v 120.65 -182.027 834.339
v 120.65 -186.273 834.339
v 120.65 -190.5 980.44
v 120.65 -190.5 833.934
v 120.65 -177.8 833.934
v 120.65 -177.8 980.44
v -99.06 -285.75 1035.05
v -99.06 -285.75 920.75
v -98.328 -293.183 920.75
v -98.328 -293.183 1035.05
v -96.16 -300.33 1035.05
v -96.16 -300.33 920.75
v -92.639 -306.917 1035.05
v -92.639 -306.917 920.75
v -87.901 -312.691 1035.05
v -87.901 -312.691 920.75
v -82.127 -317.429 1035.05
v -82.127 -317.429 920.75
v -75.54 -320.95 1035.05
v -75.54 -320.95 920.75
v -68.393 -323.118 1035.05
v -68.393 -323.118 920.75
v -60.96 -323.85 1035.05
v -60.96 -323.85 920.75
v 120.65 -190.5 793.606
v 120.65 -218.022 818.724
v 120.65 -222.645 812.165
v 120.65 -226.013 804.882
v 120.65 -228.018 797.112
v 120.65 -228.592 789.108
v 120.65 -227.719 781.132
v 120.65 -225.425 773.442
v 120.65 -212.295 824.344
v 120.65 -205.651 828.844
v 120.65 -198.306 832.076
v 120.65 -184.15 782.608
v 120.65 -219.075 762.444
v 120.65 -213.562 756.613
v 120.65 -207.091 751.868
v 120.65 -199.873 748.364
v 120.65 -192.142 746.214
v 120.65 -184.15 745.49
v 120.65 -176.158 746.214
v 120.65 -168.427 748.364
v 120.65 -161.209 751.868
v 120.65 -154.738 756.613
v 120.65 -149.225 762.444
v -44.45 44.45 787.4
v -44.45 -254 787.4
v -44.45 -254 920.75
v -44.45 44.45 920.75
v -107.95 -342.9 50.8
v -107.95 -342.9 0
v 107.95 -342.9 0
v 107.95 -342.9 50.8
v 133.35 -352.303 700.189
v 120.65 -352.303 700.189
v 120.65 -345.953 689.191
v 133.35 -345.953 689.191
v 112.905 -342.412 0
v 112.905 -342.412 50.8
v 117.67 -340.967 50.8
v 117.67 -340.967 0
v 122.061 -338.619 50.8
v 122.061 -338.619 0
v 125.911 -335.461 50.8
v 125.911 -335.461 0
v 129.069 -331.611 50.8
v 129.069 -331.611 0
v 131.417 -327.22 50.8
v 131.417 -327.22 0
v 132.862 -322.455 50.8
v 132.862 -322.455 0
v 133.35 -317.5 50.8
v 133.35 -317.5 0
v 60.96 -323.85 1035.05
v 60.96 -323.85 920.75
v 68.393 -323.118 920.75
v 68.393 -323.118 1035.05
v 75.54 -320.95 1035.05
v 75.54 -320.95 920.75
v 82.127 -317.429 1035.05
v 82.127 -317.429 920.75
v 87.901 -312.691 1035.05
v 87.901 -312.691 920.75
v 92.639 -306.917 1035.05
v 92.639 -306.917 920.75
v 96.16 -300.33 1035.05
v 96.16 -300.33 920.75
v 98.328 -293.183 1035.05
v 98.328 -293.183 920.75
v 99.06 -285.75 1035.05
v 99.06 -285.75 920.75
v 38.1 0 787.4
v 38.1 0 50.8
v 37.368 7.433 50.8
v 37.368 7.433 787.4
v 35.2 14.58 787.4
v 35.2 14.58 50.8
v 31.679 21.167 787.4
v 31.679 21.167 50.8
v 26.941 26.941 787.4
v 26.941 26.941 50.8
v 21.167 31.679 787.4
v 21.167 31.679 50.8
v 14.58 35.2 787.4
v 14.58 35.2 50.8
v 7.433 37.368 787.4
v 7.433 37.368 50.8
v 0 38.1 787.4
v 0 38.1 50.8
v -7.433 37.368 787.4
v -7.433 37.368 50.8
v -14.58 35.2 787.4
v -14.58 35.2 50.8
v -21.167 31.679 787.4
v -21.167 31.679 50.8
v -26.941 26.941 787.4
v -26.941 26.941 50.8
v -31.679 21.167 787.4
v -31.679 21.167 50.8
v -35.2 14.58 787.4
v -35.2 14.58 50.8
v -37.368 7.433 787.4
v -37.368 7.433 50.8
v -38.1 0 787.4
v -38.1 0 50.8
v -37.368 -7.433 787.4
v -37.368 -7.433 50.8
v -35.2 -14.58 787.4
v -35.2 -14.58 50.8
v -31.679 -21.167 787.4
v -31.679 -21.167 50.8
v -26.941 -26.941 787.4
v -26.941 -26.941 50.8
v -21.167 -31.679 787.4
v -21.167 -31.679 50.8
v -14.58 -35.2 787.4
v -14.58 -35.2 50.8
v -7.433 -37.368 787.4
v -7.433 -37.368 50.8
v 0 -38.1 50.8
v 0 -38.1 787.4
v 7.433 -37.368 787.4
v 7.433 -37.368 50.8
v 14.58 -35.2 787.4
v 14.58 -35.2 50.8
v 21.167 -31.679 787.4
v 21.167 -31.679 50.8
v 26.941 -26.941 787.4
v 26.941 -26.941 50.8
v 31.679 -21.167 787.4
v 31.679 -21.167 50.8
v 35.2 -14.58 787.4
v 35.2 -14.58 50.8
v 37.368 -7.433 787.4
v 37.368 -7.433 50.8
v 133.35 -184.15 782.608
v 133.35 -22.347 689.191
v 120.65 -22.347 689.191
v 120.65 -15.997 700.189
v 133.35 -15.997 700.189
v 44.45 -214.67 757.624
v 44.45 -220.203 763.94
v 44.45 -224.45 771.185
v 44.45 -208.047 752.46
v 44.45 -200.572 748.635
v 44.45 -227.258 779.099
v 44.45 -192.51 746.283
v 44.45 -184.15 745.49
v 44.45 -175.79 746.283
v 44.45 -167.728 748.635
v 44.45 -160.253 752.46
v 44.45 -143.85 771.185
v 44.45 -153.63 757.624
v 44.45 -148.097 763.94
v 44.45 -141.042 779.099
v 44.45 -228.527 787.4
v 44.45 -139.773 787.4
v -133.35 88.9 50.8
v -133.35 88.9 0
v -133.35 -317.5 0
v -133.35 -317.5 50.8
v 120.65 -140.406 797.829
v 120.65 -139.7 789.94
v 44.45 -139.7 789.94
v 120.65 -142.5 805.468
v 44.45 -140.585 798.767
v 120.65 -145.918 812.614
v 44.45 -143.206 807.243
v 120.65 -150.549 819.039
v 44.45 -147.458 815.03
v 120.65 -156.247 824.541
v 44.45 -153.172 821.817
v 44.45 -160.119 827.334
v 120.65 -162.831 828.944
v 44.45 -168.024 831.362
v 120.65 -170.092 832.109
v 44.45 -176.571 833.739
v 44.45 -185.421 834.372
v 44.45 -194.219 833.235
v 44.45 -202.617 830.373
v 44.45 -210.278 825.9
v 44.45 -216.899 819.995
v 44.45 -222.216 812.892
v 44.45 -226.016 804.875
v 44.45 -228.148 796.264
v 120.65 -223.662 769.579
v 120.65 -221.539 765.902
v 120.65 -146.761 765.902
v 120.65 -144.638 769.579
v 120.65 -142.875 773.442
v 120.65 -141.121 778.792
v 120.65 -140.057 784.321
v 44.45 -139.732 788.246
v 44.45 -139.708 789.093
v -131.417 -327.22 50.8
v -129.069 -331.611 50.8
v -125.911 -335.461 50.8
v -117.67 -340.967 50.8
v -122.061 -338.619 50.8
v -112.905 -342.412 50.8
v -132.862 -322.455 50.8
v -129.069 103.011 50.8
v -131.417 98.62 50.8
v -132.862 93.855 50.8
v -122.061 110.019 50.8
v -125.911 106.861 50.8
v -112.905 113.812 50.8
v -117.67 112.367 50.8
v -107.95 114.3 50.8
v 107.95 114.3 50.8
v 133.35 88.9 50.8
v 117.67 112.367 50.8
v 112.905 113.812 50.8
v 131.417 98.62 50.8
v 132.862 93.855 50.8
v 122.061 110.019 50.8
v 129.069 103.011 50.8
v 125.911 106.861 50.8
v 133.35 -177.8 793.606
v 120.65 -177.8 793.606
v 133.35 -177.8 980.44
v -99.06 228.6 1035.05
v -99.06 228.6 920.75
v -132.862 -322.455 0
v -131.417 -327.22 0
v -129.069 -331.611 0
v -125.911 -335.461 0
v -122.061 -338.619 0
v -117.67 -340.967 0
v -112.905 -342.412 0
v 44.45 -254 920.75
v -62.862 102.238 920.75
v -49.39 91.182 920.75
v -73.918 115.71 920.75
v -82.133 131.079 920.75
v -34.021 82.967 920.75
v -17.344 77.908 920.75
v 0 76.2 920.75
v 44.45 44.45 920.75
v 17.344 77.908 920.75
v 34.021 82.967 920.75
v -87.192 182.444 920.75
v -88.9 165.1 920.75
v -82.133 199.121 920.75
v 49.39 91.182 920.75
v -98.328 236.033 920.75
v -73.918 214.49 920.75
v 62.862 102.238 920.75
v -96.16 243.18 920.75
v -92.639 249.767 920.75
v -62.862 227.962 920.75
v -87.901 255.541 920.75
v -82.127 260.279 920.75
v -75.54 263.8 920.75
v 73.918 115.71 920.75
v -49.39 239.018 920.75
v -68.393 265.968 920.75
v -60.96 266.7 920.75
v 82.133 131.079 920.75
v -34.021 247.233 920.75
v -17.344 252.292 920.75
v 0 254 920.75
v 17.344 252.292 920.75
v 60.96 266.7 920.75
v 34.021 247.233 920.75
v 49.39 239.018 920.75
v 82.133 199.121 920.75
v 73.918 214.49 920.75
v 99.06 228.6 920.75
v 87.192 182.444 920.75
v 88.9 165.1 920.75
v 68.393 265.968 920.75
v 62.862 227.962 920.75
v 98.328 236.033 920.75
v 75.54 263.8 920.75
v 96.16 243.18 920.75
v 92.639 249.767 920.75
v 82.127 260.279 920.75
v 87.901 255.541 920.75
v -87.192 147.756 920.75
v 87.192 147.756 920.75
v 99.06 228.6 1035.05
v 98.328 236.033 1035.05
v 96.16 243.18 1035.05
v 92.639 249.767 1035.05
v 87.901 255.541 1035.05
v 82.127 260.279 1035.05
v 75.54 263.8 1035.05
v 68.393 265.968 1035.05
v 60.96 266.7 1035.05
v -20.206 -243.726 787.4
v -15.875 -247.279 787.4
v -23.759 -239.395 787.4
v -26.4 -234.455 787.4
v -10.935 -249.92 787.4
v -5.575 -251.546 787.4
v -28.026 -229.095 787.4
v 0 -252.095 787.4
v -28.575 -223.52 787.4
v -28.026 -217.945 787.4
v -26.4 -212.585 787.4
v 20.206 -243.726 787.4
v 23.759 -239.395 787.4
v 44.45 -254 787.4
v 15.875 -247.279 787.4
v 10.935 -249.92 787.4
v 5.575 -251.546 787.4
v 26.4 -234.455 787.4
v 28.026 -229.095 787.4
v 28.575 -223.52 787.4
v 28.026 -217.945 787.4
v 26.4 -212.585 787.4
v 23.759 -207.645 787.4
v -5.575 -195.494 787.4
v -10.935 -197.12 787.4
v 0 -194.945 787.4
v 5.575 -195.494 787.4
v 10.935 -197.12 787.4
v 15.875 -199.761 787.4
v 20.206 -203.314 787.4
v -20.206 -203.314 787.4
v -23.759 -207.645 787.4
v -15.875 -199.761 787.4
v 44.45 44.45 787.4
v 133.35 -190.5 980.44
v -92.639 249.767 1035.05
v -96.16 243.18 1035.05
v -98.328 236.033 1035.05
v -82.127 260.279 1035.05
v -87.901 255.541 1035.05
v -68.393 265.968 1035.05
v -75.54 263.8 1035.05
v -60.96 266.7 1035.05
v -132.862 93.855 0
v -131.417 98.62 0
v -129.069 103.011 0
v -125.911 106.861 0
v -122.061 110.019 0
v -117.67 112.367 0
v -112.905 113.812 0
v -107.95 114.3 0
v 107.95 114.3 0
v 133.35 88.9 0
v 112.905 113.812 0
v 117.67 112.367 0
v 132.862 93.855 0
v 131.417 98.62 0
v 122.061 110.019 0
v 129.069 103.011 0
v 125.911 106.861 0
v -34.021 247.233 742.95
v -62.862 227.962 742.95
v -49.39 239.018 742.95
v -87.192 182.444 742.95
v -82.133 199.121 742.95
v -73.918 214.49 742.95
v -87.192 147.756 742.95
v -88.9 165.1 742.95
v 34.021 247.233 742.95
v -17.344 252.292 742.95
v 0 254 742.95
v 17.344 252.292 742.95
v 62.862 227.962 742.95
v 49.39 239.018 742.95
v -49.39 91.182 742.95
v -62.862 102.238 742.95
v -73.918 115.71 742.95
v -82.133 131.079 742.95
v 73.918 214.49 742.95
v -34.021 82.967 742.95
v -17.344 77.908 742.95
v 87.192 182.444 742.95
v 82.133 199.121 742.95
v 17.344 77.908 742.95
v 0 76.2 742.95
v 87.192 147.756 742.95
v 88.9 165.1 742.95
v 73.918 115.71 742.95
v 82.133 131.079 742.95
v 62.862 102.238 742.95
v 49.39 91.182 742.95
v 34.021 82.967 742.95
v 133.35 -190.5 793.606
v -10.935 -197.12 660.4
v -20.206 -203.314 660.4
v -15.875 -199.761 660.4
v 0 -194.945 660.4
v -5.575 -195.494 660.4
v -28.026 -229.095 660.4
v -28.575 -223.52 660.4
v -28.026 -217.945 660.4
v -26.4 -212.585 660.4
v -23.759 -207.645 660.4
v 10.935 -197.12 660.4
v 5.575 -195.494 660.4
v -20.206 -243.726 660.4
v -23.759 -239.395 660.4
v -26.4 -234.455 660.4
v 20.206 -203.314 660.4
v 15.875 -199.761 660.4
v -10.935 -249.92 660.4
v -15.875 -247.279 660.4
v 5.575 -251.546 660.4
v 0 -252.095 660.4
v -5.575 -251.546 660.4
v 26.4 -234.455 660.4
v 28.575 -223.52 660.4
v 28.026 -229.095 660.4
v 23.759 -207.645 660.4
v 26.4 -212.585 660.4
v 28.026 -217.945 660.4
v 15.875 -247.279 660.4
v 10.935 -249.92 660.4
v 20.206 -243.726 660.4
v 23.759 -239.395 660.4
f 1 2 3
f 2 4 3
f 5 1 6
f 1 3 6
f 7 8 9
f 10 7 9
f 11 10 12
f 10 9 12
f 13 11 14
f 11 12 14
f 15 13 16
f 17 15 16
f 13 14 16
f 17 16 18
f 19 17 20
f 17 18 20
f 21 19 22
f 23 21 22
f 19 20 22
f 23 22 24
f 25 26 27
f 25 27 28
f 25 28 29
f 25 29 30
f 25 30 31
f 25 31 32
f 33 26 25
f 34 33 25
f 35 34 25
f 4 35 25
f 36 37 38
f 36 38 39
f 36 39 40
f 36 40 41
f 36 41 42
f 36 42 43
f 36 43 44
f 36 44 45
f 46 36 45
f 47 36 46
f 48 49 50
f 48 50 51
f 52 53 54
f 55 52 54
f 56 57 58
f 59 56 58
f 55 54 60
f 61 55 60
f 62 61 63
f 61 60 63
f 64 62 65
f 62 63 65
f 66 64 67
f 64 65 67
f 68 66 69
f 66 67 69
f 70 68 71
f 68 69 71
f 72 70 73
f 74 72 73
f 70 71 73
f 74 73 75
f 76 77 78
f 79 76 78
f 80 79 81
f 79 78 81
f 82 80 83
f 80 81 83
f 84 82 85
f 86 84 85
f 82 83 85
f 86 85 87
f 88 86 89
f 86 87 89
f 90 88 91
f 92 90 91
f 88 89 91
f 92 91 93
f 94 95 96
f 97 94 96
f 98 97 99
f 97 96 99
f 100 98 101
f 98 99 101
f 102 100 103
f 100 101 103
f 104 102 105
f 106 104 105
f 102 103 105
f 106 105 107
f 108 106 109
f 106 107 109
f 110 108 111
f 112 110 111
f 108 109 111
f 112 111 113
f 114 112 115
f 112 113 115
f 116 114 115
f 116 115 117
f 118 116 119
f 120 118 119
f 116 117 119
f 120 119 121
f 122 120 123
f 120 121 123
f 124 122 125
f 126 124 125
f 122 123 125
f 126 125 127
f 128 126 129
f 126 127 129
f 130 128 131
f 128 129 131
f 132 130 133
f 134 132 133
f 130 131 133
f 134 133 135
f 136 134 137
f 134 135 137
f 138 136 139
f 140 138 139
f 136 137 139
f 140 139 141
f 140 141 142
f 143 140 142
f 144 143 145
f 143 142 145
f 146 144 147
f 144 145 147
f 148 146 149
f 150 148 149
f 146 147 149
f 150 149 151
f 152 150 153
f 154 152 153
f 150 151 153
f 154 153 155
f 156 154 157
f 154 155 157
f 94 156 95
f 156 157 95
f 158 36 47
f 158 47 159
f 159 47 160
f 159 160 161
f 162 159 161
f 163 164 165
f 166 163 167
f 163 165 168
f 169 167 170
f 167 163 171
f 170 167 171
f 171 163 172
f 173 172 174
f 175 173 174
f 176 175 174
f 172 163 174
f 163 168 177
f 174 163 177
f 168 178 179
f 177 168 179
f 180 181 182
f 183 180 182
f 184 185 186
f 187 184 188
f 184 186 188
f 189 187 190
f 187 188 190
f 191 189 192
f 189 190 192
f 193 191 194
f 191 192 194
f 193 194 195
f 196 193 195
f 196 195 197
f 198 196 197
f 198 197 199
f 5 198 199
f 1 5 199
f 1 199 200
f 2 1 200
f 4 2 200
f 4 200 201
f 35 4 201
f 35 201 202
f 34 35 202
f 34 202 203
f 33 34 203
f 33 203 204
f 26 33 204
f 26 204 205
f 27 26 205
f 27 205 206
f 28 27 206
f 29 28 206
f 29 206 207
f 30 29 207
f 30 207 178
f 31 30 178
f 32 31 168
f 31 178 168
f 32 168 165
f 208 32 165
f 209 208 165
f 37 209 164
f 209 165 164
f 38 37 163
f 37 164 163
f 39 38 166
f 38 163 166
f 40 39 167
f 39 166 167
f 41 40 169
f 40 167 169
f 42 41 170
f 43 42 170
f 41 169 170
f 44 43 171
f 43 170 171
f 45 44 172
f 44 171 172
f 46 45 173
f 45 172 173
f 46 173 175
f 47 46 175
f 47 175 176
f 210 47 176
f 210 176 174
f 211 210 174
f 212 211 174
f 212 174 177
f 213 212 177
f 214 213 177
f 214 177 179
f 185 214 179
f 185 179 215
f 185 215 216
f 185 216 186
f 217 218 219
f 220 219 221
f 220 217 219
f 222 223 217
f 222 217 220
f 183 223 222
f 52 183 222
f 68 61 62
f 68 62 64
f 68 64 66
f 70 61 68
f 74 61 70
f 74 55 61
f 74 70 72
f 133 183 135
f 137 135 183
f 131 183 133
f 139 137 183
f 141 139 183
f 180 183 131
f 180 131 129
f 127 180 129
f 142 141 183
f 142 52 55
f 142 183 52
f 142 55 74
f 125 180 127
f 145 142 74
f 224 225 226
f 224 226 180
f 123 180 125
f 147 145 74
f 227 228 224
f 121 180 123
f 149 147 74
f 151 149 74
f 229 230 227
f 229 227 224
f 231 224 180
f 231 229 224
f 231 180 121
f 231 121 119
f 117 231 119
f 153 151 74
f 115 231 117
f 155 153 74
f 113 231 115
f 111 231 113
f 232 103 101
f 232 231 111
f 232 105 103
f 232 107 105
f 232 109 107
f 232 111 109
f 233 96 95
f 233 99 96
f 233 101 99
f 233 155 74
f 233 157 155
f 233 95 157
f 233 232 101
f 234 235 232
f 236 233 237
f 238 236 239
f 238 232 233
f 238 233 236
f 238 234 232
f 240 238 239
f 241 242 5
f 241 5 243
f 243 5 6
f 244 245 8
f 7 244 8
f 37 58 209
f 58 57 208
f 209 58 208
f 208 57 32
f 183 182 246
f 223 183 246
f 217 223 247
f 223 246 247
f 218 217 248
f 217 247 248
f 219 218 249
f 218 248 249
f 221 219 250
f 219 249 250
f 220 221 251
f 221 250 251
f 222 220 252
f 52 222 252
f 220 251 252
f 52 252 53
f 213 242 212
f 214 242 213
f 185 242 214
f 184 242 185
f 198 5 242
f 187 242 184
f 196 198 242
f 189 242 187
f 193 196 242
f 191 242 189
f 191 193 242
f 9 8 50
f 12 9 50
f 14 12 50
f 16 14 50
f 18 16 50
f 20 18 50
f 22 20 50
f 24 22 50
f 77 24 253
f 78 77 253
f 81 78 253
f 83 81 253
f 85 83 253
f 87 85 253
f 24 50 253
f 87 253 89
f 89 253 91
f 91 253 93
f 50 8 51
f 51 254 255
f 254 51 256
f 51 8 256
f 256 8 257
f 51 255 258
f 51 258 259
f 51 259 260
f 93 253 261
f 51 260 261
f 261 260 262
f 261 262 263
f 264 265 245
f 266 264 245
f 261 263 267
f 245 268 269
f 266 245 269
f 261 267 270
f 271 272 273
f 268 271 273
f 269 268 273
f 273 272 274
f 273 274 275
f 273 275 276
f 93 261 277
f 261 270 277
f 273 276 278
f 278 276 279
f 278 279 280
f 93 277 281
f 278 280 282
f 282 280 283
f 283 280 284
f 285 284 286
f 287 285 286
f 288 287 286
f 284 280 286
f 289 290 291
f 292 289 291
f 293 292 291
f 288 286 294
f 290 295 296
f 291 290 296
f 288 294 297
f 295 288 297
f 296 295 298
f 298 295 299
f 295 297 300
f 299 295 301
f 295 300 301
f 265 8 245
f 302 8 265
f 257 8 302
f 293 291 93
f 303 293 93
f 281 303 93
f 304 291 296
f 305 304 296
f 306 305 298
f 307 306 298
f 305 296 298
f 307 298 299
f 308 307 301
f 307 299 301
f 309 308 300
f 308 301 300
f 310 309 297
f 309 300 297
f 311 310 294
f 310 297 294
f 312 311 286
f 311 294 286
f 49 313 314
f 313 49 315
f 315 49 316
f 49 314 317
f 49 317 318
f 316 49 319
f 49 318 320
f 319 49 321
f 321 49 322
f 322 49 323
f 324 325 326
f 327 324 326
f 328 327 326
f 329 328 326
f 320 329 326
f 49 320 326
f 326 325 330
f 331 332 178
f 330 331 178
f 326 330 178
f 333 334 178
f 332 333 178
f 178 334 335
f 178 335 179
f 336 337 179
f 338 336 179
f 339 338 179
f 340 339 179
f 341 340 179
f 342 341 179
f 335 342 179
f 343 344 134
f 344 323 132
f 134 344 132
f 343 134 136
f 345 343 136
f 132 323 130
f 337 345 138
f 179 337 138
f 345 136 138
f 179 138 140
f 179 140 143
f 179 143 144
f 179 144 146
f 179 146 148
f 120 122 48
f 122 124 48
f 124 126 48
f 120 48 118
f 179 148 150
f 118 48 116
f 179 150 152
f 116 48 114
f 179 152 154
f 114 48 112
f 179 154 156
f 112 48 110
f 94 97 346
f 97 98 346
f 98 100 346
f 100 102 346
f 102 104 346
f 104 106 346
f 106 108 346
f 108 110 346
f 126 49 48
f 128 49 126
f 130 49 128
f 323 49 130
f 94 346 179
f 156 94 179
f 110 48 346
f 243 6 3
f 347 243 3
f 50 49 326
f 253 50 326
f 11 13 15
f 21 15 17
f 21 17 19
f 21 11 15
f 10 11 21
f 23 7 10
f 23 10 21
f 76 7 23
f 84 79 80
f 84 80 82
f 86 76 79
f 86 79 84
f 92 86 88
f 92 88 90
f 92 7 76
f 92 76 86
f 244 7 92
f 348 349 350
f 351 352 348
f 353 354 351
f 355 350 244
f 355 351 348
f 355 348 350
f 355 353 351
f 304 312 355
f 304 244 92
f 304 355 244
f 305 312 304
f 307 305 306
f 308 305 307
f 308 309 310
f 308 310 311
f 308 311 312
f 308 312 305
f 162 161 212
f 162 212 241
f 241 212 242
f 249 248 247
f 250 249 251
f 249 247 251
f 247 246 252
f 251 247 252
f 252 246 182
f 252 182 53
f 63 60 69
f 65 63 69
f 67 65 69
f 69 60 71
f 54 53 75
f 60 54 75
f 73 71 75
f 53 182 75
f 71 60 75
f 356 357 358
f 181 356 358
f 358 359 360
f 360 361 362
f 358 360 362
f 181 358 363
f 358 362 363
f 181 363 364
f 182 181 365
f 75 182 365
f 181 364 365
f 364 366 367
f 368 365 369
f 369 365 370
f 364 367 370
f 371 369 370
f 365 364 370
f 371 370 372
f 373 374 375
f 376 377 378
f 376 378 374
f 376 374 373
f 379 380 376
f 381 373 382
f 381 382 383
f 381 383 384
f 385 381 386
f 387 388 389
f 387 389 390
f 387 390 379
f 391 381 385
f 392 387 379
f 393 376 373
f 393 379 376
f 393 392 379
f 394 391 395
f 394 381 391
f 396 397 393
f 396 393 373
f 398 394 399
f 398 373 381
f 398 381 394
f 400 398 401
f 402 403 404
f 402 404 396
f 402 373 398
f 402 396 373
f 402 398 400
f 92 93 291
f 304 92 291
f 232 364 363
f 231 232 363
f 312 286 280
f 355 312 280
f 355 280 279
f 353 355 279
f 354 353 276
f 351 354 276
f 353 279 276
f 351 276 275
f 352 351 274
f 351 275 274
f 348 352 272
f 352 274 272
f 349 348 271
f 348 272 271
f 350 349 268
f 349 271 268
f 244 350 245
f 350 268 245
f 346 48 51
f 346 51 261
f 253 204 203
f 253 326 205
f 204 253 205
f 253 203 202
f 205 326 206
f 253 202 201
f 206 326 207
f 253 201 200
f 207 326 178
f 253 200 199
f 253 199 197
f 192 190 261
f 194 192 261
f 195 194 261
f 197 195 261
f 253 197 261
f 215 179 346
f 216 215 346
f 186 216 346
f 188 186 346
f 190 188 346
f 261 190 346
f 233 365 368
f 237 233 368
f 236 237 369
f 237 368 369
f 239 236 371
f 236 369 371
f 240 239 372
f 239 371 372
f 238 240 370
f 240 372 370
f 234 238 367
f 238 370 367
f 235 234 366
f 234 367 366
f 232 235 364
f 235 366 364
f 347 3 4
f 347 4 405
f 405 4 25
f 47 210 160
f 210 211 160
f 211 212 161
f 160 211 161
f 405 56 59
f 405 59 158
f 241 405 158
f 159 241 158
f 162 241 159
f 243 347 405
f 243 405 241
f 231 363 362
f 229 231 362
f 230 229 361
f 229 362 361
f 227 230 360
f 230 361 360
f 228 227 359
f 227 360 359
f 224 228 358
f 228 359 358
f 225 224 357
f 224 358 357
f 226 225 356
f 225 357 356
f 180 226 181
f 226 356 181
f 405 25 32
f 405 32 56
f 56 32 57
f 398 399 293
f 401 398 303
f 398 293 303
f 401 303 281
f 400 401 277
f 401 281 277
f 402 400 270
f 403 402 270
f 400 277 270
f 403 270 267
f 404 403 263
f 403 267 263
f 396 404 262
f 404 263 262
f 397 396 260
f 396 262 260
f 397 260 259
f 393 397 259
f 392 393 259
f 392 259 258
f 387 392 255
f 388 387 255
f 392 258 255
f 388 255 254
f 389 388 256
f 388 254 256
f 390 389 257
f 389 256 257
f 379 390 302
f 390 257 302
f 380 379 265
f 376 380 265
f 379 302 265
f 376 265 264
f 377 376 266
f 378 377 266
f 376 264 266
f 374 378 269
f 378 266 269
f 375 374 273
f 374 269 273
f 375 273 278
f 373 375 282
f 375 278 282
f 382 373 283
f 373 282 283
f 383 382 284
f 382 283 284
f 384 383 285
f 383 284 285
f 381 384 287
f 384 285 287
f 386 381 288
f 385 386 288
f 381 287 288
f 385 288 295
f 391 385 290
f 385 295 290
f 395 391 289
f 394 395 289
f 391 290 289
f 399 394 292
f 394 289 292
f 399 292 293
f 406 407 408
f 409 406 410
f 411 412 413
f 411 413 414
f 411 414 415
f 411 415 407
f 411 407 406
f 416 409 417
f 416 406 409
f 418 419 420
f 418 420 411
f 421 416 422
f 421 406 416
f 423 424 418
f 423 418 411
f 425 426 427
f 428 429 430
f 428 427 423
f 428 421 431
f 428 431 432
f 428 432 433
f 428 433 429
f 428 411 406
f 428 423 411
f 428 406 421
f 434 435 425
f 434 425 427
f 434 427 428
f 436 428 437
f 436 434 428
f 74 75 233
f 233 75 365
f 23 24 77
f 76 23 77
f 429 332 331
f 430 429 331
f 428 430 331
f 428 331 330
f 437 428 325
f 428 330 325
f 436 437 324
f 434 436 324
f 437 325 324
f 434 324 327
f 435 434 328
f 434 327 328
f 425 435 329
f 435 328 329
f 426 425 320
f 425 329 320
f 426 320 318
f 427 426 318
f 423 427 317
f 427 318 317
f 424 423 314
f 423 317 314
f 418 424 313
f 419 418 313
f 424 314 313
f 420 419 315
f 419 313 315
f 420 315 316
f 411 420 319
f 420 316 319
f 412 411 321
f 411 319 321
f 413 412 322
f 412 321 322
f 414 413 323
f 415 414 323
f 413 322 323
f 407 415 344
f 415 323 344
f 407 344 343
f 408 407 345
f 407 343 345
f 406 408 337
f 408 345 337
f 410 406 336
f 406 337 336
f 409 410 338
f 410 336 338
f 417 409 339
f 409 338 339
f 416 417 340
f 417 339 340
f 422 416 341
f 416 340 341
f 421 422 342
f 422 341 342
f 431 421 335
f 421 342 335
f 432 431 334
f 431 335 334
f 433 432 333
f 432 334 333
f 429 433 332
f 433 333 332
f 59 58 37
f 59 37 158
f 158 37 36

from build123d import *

# Parameters (mm, degrees)
F1_DEPTH  = 50.8
F2_R      = 38.1
F3_DEPTH  = 736.6
F4_W      = 88.9
F4_H      = 298.45
F5_DEPTH  = 133.35
F7_DEPTH  = 114.3
F8_R      = 88.9
F9_DEPTH  = 177.8
F10_R     = 44.45
F11_DEPTH = 76.2
F13_DEPTH = 12.7
F14_DEPTH = 12.7
F15_R     = 28.575
F16_DEPTH = 127


with BuildPart() as f1:
    # F0 (on Top) → F1 (new body)
    with BuildSketch(Plane.XY):
        with BuildLine():
            Line((107.95, 114.3), (-107.95, 114.3))
            ThreePointArc((-107.95, 114.3), (-125.910512, 106.860512), (-133.35, 88.9))
            Line((-133.35, 88.9), (-133.35, -317.5))
            ThreePointArc((-133.35, -317.5), (-125.910512, -335.460512), (-107.95, -342.9))
            Line((-107.95, -342.9), (107.95, -342.9))
            ThreePointArc((107.95, -342.9), (125.910512, -335.460512), (133.35, -317.5))
            Line((133.35, -317.5), (133.35, 88.9))
            ThreePointArc((133.35, 88.9), (125.910512, 106.860512), (107.95, 114.3))
        make_face()
    extrude(amount=F1_DEPTH)

    # F2 (on face) → F3 (join)
    with BuildSketch(Plane.XY.offset(50.8)):
        Circle(F2_R)
    extrude(amount=F3_DEPTH)

    # F4 (on face) → F5 (join)
    with BuildSketch(Plane.XY.offset(787.4)):
        with Locations((0, -104.775)):
            Rectangle(F4_W, F4_H)
    extrude(amount=F5_DEPTH)

    # F6 (on face) → F7 (join)
    with BuildSketch(Plane.XY.offset(920.75)):
        with BuildLine():
            Line((60.96, 266.7), (-60.96, 266.7))
            ThreePointArc((-60.96, 266.7), (-87.900768, 255.540768), (-99.06, 228.6))
            Line((-99.06, 228.6), (-99.06, -285.75))
            ThreePointArc((-99.06, -285.75), (-87.900768, -312.690768), (-60.96, -323.85))
            Line((-60.96, -323.85), (60.96, -323.85))
            ThreePointArc((60.96, -323.85), (87.900768, -312.690768), (99.06, -285.75))
            Line((99.06, -285.75), (99.06, 228.6))
            ThreePointArc((99.06, 228.6), (87.900768, 255.540768), (60.96, 266.7))
        make_face()
    extrude(amount=F7_DEPTH)

    # F8 (on face) → F9 (join)
    with BuildSketch(Plane(origin=(0, 0, 920.75), x_dir=(1, 0, 0), z_dir=(0, 0, -1))):
        with Locations((0, -165.1)):
            Circle(F8_R)
    extrude(amount=F9_DEPTH)

    # F10 (on face) → F11 (join)
    with BuildSketch(Plane.YZ.offset(44.45)):
        with Locations((-184.15, 789.94)):
            Circle(F10_R)
    extrude(amount=F11_DEPTH)

    # F12 (on face) → F13 (join)
    with BuildSketch(Plane.YZ.offset(120.65)):
        Polygon((-15.997161, 700.189261), (-177.8, 793.606174), (-177.8, 980.44), (-190.5, 980.44), (-190.5, 793.606174), (-352.302839, 700.189261), (-345.952839, 689.190739), (-184.15, 782.607652), (-22.347161, 689.190739), align=None)
    extrude(amount=F13_DEPTH)

    # F12 (on face) → F14 (join)
    with BuildSketch(Plane.YZ.offset(120.65)):
        Polygon((-15.997161, 700.189261), (-177.8, 793.606174), (-177.8, 980.44), (-190.5, 980.44), (-190.5, 793.606174), (-352.302839, 700.189261), (-345.952839, 689.190739), (-184.15, 782.607652), (-22.347161, 689.190739), align=None)
    extrude(amount=F14_DEPTH)

    # F15 (on face) → F16 (join)
    with BuildSketch(Plane(origin=(0, 0, 787.4), x_dir=(1, 0, 0), z_dir=(0, 0, -1))):
        with Locations((0, 223.52)):
            Circle(F15_R)
    extrude(amount=F16_DEPTH)


solid = f1.part
